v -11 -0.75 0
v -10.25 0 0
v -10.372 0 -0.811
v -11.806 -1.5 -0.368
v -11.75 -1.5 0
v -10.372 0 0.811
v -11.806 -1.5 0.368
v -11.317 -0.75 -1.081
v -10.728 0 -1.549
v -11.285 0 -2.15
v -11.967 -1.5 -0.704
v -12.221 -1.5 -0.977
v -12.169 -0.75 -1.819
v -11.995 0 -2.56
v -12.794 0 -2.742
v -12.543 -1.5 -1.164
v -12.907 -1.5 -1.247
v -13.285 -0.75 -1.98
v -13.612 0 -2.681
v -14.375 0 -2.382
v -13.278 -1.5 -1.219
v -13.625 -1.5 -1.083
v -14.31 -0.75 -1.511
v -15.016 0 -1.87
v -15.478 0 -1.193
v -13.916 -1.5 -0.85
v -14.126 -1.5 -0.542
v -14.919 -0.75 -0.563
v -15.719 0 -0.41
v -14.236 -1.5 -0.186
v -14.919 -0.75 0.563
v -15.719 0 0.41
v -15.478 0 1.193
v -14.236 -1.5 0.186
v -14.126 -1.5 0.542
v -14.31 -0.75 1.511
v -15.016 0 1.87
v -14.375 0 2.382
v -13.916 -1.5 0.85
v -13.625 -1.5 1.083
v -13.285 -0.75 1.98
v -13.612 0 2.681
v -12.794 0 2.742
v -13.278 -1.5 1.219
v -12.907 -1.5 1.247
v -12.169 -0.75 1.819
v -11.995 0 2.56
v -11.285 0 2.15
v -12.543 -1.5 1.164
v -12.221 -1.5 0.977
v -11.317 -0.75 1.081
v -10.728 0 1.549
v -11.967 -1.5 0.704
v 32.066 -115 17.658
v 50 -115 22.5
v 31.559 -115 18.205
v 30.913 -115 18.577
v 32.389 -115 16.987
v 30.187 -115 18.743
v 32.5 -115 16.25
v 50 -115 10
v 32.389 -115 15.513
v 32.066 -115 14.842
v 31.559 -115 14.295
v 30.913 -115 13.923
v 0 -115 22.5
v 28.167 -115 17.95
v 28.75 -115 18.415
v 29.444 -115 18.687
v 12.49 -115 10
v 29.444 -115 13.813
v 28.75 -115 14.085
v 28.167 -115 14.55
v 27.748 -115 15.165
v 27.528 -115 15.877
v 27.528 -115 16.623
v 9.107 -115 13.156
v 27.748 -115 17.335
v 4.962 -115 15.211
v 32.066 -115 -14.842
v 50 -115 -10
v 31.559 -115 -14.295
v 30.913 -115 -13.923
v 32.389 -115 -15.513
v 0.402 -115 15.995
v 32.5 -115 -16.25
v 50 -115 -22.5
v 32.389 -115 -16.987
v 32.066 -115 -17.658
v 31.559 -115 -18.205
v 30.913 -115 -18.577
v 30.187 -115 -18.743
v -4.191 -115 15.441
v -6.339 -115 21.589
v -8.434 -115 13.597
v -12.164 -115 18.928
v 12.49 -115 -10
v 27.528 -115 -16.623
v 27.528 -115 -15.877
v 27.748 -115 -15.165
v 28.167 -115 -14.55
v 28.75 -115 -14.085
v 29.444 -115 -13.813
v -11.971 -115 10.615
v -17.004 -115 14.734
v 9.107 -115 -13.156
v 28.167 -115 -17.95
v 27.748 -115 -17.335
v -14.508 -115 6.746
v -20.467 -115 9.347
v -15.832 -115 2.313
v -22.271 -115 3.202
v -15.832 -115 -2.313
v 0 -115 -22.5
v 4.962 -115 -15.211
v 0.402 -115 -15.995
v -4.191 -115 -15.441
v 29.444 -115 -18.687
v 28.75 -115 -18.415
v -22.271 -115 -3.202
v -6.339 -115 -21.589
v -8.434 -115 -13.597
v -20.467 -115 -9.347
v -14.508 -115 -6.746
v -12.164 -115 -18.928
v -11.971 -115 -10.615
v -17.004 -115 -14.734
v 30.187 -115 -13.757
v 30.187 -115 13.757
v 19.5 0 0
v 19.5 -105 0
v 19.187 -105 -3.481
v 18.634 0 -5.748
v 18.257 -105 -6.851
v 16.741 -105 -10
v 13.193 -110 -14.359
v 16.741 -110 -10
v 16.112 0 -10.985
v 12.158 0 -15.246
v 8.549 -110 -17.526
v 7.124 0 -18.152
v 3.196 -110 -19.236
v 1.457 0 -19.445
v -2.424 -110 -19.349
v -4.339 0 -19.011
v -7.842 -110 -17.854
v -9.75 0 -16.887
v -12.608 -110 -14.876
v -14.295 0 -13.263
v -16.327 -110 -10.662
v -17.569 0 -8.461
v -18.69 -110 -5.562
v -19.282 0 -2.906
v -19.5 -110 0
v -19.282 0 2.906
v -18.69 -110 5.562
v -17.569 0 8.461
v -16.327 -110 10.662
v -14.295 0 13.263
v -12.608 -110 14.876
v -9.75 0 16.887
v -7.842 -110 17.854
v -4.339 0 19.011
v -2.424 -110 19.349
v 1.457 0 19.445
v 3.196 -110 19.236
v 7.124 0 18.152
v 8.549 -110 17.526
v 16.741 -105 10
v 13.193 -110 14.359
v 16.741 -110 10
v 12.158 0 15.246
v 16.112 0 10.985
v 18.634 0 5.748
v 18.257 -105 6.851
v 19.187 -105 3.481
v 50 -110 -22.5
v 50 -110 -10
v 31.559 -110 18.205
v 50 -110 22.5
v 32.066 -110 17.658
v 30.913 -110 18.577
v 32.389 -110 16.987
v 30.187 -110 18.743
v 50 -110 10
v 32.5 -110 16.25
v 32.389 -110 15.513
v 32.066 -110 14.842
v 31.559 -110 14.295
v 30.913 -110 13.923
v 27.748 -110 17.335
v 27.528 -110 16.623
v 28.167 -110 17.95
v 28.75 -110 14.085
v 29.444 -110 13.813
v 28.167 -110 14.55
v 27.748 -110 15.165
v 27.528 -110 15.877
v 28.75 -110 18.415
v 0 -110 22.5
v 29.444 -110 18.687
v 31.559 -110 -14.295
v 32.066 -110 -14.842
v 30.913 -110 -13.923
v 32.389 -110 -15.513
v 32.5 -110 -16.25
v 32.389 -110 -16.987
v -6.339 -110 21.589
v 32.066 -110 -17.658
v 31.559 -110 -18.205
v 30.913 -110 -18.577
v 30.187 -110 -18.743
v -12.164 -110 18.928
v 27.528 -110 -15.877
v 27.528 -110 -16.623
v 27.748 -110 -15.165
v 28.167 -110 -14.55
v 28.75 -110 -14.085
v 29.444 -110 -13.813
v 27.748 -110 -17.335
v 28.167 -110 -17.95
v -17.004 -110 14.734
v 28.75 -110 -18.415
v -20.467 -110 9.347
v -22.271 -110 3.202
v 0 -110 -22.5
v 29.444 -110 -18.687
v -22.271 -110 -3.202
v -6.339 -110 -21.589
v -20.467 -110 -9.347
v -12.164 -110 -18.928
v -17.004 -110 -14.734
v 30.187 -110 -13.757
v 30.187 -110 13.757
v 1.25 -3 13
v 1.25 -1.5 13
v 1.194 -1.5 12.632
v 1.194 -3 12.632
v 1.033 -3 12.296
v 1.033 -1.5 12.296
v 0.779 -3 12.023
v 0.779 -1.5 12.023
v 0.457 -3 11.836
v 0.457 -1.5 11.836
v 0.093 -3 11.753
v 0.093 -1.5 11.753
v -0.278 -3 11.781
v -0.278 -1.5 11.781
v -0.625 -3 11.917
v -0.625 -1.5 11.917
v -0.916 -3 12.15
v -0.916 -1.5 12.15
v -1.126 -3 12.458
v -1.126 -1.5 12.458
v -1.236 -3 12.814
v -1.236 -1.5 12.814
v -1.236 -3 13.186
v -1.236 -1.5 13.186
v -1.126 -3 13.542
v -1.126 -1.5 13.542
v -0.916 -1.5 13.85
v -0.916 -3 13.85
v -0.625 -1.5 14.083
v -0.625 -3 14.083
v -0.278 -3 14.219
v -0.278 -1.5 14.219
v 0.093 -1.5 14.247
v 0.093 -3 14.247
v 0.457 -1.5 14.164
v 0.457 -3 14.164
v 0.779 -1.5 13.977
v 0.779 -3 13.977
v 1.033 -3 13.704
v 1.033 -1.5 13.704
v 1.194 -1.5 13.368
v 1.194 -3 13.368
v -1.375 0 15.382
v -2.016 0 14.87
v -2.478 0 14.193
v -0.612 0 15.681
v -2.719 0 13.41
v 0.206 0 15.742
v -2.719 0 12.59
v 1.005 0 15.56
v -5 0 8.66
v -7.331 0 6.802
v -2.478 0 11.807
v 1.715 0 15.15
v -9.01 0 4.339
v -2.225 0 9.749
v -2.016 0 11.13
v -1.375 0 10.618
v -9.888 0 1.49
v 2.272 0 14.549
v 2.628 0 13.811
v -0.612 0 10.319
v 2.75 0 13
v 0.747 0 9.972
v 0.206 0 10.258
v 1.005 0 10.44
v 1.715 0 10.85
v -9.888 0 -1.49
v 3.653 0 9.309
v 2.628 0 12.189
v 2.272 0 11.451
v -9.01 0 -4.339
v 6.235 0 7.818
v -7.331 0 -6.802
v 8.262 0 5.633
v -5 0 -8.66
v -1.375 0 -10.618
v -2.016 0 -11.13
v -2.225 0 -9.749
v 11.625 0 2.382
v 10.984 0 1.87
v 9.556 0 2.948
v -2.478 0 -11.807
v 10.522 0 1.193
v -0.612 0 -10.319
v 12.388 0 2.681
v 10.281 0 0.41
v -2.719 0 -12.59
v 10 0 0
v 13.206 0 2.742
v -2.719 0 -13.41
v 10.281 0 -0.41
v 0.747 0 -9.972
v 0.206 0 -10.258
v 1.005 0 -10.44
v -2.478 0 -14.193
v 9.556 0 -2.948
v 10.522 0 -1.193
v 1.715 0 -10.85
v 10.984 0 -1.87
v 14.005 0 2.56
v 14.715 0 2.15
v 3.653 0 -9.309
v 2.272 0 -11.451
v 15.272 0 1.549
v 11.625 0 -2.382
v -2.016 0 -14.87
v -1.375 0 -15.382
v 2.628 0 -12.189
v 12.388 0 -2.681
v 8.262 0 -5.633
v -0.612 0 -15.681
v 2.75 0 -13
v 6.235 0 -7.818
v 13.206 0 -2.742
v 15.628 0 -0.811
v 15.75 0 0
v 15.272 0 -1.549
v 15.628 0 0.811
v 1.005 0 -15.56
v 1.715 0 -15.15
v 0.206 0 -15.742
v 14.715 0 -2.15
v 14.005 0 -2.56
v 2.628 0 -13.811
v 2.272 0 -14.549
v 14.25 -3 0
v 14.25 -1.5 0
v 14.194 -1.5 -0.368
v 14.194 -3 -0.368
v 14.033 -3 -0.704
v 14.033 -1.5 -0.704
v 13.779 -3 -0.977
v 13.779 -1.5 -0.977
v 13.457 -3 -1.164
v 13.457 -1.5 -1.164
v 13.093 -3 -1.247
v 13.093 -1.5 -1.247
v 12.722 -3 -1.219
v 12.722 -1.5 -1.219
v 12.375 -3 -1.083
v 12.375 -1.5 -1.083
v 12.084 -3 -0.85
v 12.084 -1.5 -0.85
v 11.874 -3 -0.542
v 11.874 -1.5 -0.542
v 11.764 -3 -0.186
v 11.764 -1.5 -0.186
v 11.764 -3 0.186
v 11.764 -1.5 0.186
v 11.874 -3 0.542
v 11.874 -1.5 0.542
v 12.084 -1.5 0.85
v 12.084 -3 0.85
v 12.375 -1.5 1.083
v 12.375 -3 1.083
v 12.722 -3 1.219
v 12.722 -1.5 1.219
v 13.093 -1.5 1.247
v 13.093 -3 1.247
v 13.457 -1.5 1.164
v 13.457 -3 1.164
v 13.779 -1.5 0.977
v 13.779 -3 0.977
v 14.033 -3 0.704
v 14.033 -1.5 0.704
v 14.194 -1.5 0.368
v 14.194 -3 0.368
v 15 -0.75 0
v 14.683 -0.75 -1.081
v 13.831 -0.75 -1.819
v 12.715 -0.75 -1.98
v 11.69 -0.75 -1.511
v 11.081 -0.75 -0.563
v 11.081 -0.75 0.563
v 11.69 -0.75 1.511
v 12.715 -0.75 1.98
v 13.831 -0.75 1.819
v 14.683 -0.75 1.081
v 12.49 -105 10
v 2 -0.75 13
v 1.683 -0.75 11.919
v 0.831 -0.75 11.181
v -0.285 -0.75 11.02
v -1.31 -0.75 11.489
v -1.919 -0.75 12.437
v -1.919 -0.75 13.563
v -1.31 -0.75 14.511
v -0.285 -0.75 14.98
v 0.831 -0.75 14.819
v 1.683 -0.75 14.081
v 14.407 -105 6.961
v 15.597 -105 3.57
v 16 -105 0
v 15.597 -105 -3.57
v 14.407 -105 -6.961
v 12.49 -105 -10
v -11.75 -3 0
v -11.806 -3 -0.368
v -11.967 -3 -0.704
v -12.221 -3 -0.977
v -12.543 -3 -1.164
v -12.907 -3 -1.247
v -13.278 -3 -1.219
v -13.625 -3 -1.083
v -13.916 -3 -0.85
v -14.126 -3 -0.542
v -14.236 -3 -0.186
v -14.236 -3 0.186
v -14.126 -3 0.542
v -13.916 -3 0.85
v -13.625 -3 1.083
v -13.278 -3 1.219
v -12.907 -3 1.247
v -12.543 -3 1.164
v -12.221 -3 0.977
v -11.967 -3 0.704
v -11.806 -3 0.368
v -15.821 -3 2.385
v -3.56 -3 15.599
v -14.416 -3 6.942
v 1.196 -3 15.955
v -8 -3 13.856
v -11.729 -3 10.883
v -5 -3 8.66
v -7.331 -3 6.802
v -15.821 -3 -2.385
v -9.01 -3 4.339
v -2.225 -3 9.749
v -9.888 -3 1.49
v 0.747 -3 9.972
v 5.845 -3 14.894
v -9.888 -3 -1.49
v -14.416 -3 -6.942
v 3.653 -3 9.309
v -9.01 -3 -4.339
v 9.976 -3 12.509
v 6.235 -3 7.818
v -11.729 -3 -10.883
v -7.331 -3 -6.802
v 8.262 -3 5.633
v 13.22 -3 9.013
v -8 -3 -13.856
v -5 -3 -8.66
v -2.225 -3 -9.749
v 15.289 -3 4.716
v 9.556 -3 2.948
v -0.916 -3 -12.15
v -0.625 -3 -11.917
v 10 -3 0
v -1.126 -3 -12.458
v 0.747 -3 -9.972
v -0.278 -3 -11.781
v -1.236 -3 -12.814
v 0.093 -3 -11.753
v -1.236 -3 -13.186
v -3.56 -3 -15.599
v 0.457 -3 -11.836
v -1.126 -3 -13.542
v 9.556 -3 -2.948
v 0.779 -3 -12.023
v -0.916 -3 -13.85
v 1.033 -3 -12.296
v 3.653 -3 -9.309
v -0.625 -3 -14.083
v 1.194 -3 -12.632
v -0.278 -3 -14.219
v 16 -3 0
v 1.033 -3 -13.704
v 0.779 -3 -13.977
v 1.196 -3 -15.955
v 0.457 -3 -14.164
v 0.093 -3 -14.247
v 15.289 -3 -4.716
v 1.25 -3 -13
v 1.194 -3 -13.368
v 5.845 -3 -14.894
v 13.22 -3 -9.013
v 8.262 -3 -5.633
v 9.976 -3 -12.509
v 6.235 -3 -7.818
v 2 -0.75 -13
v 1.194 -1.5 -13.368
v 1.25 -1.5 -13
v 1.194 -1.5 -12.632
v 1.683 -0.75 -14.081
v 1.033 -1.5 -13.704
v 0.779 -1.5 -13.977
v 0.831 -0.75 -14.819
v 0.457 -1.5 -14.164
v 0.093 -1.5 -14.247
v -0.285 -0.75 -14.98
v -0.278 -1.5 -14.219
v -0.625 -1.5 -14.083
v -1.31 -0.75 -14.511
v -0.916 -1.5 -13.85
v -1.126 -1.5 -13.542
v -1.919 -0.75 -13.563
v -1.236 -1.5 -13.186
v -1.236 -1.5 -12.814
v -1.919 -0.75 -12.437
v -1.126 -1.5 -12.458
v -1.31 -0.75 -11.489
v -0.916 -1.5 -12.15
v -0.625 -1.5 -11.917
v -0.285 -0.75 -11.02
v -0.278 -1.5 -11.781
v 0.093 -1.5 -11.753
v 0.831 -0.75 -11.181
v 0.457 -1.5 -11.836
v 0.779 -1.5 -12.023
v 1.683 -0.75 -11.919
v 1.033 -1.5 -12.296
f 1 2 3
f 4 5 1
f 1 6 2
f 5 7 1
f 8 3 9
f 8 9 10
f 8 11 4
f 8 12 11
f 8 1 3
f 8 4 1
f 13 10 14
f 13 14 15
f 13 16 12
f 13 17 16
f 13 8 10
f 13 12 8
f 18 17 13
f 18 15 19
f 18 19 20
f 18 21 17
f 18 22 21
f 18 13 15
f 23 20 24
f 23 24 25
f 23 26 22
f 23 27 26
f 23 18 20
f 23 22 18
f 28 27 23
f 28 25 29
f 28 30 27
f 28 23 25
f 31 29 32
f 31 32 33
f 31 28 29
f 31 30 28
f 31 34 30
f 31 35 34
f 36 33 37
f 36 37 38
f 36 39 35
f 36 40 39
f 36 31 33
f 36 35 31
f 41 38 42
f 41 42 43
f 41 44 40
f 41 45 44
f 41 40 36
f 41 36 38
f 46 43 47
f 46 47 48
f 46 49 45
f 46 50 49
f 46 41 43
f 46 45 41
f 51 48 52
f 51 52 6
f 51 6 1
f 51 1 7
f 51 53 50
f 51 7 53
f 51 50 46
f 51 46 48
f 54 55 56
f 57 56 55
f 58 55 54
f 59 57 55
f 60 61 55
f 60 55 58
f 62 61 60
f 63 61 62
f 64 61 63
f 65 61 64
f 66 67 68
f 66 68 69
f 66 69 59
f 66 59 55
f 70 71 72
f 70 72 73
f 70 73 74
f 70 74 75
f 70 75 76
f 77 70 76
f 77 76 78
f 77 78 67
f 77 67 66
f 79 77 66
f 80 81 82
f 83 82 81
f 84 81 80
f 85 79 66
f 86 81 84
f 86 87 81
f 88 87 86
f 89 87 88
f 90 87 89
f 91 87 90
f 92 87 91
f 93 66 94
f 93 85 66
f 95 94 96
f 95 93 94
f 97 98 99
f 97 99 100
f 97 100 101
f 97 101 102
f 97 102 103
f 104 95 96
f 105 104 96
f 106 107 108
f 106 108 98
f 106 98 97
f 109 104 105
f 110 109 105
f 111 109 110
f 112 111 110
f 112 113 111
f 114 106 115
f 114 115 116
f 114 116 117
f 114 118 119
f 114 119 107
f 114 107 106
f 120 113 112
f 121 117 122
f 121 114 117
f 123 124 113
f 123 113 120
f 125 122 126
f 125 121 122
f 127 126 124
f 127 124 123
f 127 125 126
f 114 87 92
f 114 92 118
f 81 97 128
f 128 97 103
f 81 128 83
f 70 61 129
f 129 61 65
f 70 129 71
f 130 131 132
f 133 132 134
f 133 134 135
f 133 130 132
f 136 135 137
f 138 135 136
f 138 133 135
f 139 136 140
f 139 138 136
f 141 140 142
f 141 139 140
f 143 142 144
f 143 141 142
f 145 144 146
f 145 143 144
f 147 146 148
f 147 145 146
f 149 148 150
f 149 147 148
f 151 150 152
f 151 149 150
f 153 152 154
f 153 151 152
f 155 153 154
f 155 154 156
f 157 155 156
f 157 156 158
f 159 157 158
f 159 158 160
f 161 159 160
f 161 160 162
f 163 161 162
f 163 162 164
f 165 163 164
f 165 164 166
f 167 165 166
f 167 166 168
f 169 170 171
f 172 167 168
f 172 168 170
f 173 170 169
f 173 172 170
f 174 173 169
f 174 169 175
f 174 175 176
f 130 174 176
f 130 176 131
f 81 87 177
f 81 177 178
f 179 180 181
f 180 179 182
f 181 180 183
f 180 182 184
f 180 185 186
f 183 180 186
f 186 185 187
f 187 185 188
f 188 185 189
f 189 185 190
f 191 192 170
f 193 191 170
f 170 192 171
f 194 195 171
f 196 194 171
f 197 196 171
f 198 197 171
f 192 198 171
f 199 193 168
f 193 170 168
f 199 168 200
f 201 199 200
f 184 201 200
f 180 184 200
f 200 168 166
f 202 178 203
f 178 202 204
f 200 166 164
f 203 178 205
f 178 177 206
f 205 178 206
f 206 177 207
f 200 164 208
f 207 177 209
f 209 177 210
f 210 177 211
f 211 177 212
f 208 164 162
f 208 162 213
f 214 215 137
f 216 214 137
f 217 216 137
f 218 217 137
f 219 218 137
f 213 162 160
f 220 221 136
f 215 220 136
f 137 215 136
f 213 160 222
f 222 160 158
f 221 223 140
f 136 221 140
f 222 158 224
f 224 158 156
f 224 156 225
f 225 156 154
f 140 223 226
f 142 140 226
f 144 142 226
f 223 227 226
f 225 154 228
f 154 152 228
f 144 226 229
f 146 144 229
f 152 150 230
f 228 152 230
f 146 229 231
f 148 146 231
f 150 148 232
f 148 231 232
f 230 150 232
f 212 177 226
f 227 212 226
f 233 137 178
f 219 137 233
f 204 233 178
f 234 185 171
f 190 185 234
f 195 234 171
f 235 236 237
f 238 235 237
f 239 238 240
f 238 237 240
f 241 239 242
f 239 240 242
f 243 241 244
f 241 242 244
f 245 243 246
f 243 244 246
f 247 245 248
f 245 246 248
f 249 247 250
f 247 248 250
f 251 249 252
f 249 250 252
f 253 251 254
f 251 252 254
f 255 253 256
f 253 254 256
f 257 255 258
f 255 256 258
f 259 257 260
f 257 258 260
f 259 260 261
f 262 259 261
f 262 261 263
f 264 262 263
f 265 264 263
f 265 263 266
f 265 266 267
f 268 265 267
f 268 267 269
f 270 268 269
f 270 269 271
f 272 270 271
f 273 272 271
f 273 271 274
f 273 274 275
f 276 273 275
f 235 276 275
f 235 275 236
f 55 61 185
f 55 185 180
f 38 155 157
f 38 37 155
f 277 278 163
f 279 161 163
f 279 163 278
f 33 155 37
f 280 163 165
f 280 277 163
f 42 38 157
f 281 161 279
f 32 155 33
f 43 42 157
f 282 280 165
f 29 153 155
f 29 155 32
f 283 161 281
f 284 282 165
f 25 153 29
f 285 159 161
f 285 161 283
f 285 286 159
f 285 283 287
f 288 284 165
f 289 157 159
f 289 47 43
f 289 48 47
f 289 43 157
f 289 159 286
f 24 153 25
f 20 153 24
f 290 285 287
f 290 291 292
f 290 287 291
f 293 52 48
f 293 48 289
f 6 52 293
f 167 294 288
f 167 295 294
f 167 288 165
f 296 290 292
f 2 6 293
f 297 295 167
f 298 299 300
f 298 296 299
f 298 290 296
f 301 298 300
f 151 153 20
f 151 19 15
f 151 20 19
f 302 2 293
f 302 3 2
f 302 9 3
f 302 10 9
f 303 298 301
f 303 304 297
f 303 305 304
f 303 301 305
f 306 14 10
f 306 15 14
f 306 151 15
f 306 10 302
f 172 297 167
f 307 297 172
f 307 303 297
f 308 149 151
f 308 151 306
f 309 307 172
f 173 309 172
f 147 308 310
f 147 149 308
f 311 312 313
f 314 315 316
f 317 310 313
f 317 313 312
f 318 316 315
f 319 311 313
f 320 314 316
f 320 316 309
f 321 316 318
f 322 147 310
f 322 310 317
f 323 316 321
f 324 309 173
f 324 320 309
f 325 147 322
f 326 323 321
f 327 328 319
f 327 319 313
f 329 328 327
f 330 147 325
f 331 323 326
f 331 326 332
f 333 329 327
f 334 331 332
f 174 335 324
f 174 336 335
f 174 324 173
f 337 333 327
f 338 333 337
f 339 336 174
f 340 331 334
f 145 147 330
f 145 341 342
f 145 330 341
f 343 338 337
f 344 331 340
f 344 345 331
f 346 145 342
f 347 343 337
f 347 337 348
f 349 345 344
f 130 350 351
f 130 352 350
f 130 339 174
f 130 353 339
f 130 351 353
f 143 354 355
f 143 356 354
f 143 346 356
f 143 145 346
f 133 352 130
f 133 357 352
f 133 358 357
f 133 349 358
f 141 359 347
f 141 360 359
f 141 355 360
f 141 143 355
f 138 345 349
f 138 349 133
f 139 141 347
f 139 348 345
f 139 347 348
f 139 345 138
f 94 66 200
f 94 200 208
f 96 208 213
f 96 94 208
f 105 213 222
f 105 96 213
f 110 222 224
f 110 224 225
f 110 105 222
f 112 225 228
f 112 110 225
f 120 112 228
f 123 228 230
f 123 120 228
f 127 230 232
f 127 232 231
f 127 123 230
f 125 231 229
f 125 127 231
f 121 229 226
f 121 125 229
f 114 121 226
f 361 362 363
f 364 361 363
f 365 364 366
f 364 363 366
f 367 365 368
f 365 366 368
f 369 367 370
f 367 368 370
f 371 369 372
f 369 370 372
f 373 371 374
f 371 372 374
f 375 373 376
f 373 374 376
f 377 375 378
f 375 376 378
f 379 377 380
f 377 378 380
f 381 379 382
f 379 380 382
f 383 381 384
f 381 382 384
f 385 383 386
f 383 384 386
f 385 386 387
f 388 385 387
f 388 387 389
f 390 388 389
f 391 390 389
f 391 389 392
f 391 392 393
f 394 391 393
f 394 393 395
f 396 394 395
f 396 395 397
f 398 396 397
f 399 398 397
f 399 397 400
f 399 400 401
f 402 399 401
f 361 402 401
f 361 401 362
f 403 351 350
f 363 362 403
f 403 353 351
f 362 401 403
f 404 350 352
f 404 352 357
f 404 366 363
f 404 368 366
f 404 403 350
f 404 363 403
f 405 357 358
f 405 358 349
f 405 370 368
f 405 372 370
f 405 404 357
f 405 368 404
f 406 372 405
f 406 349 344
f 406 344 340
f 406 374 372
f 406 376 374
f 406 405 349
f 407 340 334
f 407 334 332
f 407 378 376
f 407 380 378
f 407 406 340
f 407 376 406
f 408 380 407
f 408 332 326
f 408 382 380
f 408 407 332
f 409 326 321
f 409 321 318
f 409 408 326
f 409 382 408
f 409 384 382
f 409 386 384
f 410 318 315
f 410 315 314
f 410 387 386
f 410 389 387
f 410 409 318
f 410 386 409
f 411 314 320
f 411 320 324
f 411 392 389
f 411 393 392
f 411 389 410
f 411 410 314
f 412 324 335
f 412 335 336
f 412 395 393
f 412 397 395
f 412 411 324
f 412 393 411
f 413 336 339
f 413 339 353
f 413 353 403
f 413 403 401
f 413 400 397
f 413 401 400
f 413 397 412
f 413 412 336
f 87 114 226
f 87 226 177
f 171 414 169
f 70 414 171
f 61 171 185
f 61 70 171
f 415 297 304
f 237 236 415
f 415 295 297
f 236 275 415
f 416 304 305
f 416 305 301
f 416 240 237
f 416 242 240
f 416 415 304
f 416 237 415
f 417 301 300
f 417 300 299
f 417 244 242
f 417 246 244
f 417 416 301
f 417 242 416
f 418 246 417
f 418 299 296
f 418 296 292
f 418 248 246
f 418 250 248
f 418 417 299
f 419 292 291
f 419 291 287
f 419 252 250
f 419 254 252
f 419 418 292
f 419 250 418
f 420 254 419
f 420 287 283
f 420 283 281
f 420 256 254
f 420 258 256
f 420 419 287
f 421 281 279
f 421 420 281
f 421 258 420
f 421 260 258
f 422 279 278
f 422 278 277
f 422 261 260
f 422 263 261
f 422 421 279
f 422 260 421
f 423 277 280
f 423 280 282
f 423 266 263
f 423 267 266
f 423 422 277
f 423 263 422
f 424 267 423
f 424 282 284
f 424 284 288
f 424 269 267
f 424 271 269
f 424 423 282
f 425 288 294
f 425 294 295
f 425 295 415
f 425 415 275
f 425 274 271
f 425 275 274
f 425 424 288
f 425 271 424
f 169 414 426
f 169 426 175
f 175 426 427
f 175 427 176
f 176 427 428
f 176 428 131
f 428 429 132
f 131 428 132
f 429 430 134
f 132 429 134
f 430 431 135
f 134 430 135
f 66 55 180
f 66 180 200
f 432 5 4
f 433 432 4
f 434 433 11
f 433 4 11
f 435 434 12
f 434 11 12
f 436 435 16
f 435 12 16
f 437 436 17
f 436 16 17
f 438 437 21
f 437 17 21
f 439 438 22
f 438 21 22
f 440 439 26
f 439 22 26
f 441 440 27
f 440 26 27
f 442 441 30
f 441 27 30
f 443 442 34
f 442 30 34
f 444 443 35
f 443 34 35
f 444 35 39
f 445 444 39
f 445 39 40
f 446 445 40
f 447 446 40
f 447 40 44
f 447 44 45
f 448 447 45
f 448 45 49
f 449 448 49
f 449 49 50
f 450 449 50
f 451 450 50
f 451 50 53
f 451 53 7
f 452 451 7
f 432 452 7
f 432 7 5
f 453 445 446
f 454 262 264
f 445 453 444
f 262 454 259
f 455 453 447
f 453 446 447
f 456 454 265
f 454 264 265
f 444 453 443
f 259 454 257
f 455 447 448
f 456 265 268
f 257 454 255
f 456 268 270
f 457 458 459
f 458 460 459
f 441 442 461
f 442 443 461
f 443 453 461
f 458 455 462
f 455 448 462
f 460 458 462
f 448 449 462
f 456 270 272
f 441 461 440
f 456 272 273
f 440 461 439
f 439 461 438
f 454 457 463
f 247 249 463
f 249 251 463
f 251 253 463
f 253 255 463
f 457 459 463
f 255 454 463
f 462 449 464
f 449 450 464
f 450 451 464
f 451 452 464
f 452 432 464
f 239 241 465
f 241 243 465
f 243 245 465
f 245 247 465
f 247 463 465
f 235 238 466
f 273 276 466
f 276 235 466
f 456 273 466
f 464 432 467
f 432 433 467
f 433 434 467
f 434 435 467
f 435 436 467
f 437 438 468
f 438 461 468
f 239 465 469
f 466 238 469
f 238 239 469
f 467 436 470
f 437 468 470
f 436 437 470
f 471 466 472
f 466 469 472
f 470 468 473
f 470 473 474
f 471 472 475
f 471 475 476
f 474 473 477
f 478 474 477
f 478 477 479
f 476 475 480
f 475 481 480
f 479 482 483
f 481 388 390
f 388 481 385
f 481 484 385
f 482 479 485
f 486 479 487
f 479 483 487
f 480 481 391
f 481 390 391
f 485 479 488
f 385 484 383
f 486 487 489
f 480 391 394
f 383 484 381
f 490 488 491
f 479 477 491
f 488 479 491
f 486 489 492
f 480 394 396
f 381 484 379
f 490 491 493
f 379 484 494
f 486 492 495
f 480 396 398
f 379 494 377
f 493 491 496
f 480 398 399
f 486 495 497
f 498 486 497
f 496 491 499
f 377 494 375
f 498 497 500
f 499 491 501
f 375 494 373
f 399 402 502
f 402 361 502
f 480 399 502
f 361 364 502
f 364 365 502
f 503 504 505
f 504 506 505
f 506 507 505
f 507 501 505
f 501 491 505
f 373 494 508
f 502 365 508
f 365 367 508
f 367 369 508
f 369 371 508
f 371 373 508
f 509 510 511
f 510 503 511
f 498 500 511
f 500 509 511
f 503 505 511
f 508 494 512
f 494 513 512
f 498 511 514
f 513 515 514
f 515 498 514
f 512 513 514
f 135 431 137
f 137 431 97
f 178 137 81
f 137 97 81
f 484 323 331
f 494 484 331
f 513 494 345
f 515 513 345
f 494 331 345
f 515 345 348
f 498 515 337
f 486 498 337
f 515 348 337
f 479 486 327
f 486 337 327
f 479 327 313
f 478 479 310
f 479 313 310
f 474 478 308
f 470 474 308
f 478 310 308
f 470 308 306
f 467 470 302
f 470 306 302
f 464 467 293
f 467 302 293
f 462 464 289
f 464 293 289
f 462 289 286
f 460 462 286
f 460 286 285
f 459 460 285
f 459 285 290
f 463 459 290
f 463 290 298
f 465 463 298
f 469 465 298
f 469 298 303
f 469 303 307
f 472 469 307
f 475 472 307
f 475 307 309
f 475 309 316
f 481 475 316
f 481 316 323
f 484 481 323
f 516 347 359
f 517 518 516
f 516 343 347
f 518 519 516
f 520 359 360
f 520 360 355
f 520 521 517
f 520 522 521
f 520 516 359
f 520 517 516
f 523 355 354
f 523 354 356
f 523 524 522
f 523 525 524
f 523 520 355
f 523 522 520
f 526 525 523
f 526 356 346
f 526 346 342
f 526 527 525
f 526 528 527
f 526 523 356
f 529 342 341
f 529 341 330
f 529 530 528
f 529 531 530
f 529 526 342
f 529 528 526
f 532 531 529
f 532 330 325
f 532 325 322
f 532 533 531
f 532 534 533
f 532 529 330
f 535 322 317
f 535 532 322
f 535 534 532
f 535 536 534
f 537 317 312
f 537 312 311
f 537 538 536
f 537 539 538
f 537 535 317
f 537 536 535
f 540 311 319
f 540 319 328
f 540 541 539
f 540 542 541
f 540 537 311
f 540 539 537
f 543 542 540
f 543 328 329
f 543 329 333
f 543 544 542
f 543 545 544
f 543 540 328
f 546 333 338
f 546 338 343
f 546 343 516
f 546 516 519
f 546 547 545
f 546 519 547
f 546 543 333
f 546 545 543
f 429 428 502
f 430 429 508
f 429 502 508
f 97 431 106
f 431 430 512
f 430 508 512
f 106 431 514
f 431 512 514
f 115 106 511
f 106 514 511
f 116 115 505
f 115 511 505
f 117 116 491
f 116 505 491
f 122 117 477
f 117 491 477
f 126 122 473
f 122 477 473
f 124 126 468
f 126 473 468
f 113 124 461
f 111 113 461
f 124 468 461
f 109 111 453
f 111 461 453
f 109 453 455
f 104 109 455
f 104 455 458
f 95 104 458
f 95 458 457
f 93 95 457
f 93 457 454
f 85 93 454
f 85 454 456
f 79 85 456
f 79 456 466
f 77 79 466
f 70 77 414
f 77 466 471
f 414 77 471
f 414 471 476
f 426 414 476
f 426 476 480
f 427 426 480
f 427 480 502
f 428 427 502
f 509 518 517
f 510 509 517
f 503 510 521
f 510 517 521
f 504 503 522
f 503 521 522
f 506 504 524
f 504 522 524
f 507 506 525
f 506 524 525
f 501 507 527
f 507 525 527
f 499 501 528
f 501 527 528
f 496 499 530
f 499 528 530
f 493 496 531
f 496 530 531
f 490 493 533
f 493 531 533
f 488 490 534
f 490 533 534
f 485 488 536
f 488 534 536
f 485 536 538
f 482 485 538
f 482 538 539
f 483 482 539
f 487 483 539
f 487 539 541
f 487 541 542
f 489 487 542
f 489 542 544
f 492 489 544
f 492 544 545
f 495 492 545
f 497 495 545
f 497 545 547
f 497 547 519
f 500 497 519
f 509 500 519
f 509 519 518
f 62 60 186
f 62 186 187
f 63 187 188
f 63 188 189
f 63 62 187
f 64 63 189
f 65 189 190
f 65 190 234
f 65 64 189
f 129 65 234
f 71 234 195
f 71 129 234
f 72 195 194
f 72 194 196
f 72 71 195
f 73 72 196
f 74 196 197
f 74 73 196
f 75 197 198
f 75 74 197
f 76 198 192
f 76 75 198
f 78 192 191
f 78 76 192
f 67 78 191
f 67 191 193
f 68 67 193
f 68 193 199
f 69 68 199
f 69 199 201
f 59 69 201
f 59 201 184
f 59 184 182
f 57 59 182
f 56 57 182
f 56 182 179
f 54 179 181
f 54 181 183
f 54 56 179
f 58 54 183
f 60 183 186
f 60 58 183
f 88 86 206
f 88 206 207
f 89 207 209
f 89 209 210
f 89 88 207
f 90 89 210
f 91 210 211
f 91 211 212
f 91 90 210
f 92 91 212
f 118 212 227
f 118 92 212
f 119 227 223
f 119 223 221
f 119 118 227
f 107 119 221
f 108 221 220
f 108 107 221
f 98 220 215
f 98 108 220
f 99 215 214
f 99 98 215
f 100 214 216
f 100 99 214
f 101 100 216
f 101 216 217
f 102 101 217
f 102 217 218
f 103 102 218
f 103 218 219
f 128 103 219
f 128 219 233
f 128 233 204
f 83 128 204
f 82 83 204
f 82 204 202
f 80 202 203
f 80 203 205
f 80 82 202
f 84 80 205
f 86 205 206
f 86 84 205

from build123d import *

# Parameters (mm, degrees)
SKETCH1_R                = 19.5
OUTERDIAMETERSTOCK_DEPTH = 115
SCREWONBASE_START        = -115
SCREWONBASE_DEPTH        = 5
INNERDIAMETER_START      = -3
SKETCH2_R                = 16
INNERDIAMETER_DEPTH      = 113
SKETCH3_R                = 10
HOLE_DEPTH               = 116
CUT_EXTRUDE3_REACH       = 117
SKETCH5_R                = 1.25
CHAMFER1_SIZE            = 1.5
WIRESLOT_START           = -115
SKETCH6_W                = 50
SKETCH6_H                = 20
WIRESLOT_DEPTH           = 10
MOUNTING_START           = -115
SKETCH7_R                = 2.5
MOUNTING_HOLES_DEPTH     = 5


with BuildPart() as part:
    # Sketch1 → OuterDiameterStock (new body)
    with BuildSketch(Plane(origin=(0, 0, 0), x_dir=(1, 0, 0), z_dir=(0, 1, 0))):
        Circle(SKETCH1_R)
    extrude(amount=-OUTERDIAMETERSTOCK_DEPTH)

    # Sketch4 → ScrewOnBase (add)
    with BuildSketch(Plane(origin=(0, 0, 0), x_dir=(1, 0, 0), z_dir=(0, 1, 0)).offset(SCREWONBASE_START)):
        with BuildLine():
            Line((0, 22.5), (50, 22.5))
            Line((50, 22.5), (50, -22.5))
            Line((50, -22.5), (0, -22.5))
            ThreePointArc((0, -22.5), (-22.5, 0), (0, 22.5))
        make_face()
    extrude(amount=SCREWONBASE_DEPTH)

    # Sketch2 → InnerDiameter (cut, through all)
    with BuildSketch(Plane(origin=(0, 0, 0), x_dir=(1, 0, 0), z_dir=(0, 1, 0)).offset(INNERDIAMETER_START)):
        Circle(SKETCH2_R)
    extrude(amount=-INNERDIAMETER_DEPTH, mode=Mode.SUBTRACT)

    # Sketch3 → Hole (cut, through all)
    with BuildSketch(Plane(origin=(0, 0, 0), x_dir=(1, 0, 0), z_dir=(0, 1, 0))):
        Circle(SKETCH3_R)
    extrude(amount=-HOLE_DEPTH, mode=Mode.SUBTRACT)

    # Sketch5 → Cut-Extrude3 (cut, up to next)
    with BuildSketch(Plane(origin=(0, 0, 0), x_dir=(1, 0, 0), z_dir=(0, 1, 0)), mode=Mode.PRIVATE) as cut_extrude3_sk1:
        with Locations((0, 13)):
            Circle(SKETCH5_R)
    cut_extrude3_tool1 = extrude(cut_extrude3_sk1.sketch, amount=-CUT_EXTRUDE3_REACH, mode=Mode.PRIVATE) & part.part
    add(cut_extrude3_tool1.solids().sort_by_distance((0, 0, -13))[0], mode=Mode.SUBTRACT)
    # Sketch5 → Cut-Extrude3 (cut, up to next)
    with BuildSketch(Plane(origin=(0, 0, 0), x_dir=(1, 0, 0), z_dir=(0, 1, 0)), mode=Mode.PRIVATE) as cut_extrude3_sk2:
        with Locations((13, 0)):
            Circle(SKETCH5_R)
    cut_extrude3_tool2 = extrude(cut_extrude3_sk2.sketch, amount=-CUT_EXTRUDE3_REACH, mode=Mode.PRIVATE) & part.part
    add(cut_extrude3_tool2.solids().sort_by_distance((13, 0, 0))[0], mode=Mode.SUBTRACT)
    # Sketch5 → Cut-Extrude3 (cut, up to next)
    with BuildSketch(Plane(origin=(0, 0, 0), x_dir=(1, 0, 0), z_dir=(0, 1, 0)), mode=Mode.PRIVATE) as cut_extrude3_sk3:
        with Locations((0, -13)):
            Circle(SKETCH5_R)
    cut_extrude3_tool3 = extrude(cut_extrude3_sk3.sketch, amount=-CUT_EXTRUDE3_REACH, mode=Mode.PRIVATE) & part.part
    add(cut_extrude3_tool3.solids().sort_by_distance((0, 0, 13))[0], mode=Mode.SUBTRACT)
    # Sketch5 → Cut-Extrude3 (cut, up to next)
    with BuildSketch(Plane(origin=(0, 0, 0), x_dir=(1, 0, 0), z_dir=(0, 1, 0)), mode=Mode.PRIVATE) as cut_extrude3_sk4:
        with Locations((-13, 0)):
            Circle(SKETCH5_R)
    cut_extrude3_tool4 = extrude(cut_extrude3_sk4.sketch, amount=-CUT_EXTRUDE3_REACH, mode=Mode.PRIVATE) & part.part
    add(cut_extrude3_tool4.solids().sort_by_distance((-13, 0, 0))[0], mode=Mode.SUBTRACT)

    # Chamfer1
    chamfer1_edges = [part.edges().sort_by_distance(p)[0] for p in [
        (-1.25, 0, -13),
        (11.75, 0, 0),
        (-1.25, 0, 13),
        (-14.25, 0, 0),
    ]]
    chamfer(chamfer1_edges, length=CHAMFER1_SIZE)

    # Sketch6 → WireSlot (cut)
    with BuildSketch(Plane(origin=(0, 0, 0), x_dir=(1, 0, 0), z_dir=(0, 1, 0)).offset(WIRESLOT_START)):
        with Locations((25, 0)):
            Rectangle(SKETCH6_W, SKETCH6_H)
    extrude(amount=WIRESLOT_DEPTH, mode=Mode.SUBTRACT)

    # Sketch7 → Mounting Holes (cut)
    with BuildSketch(Plane(origin=(0, 0, 0), x_dir=(1, 0, 0), z_dir=(0, 1, 0)).offset(MOUNTING_START)):
        with Locations((30, 16.25)):
            Circle(SKETCH7_R)
        with Locations((30, -16.25)):
            Circle(SKETCH7_R)
    extrude(amount=MOUNTING_HOLES_DEPTH, mode=Mode.SUBTRACT)


solid = part.part
